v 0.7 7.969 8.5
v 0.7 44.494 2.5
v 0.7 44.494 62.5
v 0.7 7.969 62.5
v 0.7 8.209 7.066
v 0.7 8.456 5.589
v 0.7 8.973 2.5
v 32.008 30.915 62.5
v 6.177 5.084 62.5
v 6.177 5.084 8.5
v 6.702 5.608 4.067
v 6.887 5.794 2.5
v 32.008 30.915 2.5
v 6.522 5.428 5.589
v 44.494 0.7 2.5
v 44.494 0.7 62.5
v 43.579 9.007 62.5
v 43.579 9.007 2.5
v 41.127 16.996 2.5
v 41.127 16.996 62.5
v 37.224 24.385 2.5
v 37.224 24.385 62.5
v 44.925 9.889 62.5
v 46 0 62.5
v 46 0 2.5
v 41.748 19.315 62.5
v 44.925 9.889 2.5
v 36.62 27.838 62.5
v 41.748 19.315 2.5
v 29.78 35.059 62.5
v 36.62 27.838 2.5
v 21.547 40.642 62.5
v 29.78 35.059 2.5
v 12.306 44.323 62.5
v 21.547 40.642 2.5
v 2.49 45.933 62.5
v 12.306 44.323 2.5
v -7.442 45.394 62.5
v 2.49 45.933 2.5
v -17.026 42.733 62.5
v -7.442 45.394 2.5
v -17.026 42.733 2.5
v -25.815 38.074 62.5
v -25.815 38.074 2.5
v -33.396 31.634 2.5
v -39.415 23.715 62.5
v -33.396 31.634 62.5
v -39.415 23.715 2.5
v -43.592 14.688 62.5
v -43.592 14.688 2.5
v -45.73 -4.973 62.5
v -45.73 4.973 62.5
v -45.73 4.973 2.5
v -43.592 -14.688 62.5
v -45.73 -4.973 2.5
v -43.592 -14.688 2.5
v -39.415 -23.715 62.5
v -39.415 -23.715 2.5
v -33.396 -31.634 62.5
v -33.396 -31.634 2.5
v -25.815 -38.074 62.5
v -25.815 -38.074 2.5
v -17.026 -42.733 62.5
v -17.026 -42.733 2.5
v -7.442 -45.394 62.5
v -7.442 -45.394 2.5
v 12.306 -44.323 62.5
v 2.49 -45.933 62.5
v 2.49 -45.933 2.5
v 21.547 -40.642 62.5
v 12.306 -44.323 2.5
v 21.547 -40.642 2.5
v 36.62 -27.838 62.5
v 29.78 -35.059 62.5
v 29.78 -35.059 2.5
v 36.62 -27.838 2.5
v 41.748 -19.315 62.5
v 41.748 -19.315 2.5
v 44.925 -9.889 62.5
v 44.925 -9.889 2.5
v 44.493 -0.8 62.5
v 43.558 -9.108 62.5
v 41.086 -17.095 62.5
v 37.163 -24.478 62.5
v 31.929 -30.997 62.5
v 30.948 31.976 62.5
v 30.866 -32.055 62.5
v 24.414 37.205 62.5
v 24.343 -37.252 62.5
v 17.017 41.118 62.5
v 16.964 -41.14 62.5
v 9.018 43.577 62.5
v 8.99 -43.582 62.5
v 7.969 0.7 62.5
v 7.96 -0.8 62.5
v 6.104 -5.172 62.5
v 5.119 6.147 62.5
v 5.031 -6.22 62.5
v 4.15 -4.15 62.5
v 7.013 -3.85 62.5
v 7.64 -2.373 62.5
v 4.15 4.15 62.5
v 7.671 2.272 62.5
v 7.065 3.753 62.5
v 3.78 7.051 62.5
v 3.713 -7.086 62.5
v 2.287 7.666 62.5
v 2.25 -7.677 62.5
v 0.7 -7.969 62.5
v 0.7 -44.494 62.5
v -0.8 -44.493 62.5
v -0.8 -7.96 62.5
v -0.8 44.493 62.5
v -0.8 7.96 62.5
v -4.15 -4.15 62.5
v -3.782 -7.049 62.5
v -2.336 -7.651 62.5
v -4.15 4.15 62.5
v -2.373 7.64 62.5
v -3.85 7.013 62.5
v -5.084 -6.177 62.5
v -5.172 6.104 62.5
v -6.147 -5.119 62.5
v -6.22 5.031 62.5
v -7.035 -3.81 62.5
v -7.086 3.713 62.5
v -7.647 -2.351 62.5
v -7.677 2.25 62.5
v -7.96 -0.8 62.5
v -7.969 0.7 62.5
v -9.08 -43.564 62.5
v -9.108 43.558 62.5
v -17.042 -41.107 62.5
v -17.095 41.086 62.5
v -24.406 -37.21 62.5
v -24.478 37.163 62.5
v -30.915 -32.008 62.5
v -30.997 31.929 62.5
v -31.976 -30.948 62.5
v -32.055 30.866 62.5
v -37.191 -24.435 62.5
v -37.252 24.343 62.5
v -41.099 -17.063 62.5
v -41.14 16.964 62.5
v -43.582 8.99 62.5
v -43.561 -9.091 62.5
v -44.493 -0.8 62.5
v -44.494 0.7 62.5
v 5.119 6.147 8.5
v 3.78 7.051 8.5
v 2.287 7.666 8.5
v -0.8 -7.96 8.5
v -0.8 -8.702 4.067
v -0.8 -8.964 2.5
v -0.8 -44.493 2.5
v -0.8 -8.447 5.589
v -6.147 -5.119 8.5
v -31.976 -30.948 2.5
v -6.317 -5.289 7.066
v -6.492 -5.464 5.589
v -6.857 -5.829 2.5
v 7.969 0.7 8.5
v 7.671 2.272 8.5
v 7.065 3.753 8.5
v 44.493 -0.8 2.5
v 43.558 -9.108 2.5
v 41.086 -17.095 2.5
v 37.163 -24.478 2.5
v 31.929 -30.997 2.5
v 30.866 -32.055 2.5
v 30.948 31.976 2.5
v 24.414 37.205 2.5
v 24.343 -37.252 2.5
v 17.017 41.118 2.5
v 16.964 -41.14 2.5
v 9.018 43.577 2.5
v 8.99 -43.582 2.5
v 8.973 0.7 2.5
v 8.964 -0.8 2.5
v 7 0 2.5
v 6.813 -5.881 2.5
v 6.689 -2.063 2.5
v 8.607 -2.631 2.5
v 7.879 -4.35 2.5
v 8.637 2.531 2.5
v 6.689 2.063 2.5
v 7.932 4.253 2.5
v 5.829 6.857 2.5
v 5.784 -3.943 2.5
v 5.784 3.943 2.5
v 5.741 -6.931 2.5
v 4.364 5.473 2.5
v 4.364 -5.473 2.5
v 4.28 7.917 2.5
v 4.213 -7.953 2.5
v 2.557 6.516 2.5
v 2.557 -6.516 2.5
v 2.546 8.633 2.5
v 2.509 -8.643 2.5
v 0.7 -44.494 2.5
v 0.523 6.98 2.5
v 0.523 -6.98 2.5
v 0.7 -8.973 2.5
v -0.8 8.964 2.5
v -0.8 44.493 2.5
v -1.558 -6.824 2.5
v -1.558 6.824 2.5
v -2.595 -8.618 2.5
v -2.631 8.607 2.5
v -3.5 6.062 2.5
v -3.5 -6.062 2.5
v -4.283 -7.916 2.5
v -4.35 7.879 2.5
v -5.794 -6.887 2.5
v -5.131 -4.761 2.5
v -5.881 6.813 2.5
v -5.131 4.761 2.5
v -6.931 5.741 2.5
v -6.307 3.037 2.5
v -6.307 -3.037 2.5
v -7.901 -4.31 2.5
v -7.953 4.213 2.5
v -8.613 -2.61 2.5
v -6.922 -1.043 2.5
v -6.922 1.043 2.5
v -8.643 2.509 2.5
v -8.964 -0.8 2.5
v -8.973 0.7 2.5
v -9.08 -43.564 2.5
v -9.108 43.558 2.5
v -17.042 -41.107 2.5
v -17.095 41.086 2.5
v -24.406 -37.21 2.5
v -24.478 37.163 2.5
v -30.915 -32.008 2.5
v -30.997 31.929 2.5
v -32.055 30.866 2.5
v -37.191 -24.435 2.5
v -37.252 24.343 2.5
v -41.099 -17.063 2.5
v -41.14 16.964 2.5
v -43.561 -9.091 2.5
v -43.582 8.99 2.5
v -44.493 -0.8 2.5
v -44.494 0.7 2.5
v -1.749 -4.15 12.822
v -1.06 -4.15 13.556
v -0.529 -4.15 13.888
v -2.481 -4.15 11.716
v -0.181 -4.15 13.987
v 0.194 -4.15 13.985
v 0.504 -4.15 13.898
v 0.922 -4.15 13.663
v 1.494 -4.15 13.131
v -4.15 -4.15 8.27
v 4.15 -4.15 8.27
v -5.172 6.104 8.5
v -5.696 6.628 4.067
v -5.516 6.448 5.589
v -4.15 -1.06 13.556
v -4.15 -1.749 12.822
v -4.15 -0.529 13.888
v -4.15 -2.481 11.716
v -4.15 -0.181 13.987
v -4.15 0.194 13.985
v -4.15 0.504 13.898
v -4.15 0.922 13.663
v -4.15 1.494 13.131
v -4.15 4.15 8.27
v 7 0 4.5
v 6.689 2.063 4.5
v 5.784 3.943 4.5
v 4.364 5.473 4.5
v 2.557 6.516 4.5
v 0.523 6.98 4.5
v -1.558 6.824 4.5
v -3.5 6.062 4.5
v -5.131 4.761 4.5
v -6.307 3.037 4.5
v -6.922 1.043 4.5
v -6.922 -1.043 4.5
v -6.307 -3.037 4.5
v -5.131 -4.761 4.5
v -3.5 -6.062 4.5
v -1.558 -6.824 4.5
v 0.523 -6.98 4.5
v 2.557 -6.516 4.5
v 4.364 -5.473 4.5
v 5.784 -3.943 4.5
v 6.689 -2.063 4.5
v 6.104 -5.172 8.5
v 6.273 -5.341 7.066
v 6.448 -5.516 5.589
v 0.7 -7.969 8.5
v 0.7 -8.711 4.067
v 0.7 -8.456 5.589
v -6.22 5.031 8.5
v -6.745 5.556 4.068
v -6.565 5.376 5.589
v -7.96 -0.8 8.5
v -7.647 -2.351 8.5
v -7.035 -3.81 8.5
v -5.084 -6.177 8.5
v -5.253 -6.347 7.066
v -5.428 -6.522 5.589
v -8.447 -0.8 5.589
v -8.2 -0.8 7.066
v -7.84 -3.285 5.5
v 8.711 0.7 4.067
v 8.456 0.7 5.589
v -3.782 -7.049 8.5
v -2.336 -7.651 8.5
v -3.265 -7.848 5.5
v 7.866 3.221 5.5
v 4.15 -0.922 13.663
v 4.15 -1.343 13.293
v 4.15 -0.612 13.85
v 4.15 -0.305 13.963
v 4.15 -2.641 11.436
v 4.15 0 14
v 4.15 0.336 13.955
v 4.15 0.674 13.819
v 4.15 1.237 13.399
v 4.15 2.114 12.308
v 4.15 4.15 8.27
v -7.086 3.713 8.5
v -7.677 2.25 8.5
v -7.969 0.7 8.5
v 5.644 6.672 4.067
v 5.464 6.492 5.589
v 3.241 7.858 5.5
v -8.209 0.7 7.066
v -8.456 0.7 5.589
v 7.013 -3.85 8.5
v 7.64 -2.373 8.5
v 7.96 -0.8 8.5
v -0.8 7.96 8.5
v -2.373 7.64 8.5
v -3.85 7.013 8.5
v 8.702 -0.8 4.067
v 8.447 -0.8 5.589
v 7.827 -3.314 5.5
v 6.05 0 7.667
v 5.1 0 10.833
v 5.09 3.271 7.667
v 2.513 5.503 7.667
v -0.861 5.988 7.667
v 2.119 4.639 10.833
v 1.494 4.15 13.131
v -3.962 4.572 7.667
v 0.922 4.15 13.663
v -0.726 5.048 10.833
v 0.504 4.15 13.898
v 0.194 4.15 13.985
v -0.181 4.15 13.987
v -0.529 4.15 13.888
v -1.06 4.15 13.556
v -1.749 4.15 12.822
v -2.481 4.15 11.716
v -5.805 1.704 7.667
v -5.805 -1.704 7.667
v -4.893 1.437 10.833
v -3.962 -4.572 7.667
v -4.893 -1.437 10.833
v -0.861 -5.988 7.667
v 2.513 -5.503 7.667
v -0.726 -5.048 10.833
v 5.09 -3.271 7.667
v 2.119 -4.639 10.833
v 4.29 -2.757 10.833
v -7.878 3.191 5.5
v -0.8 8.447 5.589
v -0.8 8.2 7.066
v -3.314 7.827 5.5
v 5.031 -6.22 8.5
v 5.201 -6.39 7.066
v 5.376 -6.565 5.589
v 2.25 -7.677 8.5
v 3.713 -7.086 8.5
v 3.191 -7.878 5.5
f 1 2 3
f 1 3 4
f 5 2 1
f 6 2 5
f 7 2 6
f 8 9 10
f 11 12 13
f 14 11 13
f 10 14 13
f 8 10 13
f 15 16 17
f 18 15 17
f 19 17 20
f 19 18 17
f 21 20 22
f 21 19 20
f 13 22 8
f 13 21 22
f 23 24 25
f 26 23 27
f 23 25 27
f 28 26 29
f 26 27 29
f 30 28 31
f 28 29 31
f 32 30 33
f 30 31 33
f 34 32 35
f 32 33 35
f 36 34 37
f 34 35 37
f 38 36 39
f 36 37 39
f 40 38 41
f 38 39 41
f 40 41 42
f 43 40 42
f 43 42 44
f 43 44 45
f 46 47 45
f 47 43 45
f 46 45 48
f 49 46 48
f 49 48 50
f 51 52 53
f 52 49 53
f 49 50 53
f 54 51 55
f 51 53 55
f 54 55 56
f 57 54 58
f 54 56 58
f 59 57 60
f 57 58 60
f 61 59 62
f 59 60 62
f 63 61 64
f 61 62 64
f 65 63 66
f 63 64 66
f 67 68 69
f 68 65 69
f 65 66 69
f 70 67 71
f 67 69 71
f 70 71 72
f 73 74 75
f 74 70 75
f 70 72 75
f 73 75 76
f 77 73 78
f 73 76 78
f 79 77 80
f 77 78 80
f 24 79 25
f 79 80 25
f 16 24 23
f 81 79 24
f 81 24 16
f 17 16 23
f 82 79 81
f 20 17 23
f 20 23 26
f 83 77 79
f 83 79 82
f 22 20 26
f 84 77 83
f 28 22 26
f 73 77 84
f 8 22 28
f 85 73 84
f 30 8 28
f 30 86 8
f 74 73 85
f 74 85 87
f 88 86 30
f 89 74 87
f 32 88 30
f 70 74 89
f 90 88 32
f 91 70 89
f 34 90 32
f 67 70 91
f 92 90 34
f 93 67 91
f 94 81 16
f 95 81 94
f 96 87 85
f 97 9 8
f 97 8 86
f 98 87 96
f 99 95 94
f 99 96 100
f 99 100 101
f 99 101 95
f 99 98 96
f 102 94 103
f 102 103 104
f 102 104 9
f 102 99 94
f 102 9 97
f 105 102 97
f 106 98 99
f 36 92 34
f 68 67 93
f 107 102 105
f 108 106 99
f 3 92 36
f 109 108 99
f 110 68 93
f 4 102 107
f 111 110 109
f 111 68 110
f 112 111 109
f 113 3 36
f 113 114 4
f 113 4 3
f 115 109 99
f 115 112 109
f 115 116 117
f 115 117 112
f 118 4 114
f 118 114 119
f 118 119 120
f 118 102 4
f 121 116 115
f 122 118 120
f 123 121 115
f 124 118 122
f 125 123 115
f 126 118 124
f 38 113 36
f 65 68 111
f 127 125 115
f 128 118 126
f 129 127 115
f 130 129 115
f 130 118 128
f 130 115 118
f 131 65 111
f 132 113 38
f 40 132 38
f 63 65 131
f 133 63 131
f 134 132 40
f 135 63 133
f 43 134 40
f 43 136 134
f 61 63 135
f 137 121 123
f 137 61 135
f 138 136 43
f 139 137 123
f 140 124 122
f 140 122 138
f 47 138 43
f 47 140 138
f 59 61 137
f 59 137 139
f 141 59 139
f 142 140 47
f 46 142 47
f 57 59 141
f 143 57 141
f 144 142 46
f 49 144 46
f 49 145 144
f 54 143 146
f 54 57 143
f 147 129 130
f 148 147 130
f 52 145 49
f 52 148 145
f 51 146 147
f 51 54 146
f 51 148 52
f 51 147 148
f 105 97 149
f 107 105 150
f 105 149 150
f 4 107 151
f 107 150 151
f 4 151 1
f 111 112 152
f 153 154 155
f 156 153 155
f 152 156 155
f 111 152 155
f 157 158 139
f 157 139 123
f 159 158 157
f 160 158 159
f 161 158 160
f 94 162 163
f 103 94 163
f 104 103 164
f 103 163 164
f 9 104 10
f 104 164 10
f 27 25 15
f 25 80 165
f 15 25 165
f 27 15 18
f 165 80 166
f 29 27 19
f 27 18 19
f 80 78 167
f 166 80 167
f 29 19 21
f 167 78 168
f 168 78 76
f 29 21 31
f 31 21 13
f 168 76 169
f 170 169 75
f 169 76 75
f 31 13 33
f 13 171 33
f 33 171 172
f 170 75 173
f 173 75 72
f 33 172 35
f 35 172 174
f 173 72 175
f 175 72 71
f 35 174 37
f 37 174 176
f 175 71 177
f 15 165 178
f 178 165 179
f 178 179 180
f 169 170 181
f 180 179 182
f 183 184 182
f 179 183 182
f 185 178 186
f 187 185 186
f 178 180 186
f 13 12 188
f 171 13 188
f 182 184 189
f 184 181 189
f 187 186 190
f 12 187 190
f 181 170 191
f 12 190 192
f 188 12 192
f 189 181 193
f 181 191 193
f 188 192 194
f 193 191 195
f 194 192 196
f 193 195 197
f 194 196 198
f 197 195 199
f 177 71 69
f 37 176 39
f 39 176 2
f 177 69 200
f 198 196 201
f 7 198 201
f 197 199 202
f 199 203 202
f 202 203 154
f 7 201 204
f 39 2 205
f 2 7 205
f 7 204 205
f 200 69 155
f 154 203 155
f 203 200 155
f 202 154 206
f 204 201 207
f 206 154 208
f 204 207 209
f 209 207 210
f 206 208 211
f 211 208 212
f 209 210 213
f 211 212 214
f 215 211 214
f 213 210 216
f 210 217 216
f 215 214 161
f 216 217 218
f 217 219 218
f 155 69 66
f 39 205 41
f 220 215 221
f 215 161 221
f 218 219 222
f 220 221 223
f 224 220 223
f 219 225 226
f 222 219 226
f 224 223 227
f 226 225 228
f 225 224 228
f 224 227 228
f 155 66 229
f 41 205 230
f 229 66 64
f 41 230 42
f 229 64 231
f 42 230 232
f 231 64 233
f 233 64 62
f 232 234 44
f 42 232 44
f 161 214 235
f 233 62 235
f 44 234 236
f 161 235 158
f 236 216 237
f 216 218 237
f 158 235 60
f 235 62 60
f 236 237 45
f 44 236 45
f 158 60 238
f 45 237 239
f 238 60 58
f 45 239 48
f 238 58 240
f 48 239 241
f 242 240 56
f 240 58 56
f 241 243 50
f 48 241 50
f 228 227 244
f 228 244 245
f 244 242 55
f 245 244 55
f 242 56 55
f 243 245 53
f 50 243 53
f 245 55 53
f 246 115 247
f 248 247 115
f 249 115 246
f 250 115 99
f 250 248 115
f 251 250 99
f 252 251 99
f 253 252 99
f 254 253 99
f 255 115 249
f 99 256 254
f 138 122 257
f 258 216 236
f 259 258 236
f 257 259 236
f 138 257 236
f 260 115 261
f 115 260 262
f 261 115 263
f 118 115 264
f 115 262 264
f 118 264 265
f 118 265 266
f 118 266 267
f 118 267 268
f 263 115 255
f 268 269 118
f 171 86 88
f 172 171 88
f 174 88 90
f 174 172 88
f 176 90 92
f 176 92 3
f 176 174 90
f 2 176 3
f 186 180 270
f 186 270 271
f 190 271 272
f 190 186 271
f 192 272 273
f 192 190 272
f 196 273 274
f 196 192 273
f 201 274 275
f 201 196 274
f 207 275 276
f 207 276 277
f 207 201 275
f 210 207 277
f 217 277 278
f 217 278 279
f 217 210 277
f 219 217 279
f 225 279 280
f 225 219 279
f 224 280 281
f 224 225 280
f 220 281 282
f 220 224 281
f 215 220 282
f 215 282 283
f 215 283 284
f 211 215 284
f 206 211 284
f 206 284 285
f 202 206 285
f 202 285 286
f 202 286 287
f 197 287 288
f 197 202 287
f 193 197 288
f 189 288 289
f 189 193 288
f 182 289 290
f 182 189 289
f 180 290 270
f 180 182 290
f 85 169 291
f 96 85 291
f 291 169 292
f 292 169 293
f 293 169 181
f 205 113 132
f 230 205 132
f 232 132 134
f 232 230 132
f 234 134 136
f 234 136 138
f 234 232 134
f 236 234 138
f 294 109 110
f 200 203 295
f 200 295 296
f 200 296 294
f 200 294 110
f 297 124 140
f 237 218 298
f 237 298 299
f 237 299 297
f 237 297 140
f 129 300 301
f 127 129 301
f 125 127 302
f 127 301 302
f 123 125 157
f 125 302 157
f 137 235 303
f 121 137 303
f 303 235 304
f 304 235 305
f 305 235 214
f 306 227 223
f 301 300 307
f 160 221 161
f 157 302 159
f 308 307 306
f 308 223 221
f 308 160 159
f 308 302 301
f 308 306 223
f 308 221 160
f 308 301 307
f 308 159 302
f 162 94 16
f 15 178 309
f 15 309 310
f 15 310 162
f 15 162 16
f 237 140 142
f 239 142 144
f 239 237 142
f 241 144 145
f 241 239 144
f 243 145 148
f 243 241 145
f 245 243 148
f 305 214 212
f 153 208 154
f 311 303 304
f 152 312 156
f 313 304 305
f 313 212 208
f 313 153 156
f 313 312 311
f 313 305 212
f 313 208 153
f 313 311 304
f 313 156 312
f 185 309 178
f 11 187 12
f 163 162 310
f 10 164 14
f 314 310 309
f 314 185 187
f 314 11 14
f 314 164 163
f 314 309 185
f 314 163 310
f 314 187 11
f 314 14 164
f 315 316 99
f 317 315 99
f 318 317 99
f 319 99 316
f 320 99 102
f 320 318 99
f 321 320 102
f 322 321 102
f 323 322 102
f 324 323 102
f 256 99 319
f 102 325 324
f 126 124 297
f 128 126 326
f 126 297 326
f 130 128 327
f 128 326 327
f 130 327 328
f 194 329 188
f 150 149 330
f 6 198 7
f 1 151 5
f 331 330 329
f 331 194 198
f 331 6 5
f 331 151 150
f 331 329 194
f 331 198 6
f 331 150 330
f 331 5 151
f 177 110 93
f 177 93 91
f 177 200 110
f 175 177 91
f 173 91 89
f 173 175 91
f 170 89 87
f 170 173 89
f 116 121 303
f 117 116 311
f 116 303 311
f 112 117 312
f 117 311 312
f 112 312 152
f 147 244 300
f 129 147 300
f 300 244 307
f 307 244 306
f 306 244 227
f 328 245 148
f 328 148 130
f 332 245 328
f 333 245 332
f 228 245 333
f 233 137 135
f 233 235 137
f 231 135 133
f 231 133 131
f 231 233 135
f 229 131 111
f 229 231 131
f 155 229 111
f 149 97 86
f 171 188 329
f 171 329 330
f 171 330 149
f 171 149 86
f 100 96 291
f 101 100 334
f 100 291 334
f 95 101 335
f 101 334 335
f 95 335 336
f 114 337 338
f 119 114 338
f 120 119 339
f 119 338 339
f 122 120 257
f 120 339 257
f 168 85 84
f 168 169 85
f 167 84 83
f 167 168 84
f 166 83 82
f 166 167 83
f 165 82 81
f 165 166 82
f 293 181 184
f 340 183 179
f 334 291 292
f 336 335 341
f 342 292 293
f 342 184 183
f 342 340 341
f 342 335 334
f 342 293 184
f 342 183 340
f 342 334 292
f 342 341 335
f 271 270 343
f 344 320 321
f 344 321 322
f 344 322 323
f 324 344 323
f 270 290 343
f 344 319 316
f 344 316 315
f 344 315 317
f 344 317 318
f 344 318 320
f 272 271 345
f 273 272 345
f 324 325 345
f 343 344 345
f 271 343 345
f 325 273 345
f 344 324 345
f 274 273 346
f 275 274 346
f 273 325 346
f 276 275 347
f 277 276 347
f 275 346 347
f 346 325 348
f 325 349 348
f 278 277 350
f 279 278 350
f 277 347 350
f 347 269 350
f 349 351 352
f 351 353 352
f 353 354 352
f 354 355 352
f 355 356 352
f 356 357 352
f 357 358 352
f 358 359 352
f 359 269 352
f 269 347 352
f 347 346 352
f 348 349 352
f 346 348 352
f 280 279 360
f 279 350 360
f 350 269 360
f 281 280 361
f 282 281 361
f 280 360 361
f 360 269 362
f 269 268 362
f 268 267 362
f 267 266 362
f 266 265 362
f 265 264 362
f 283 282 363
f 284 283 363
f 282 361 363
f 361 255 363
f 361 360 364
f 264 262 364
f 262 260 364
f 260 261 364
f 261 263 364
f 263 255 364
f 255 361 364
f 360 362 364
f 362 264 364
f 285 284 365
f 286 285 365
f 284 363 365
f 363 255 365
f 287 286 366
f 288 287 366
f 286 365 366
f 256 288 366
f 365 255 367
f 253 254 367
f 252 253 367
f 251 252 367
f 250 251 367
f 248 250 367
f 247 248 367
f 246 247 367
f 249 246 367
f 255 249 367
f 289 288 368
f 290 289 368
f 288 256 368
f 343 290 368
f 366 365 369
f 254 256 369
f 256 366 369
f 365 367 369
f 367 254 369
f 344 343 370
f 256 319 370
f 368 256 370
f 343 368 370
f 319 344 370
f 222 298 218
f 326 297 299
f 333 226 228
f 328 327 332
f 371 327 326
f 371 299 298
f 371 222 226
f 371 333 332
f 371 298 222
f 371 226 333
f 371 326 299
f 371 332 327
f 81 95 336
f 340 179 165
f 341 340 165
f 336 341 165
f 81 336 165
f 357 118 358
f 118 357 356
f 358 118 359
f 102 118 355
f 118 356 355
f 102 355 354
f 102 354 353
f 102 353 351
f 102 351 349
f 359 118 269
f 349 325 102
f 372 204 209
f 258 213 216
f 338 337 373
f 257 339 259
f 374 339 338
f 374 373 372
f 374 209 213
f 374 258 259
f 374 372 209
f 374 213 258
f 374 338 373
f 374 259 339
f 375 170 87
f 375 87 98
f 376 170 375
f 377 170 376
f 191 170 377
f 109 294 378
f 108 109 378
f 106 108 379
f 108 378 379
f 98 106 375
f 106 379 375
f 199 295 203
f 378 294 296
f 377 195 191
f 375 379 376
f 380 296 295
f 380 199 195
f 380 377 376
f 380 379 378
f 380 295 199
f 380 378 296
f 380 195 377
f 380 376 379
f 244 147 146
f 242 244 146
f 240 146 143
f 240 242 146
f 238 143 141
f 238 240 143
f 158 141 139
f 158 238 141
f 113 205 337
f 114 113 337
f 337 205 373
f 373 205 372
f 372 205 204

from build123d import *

# Parameters (mm, degrees)
CYLINDER014_R          = 7
CYLINDER014_DEPTH      = 2
TUBE015_R              = 60
TUBE015_R_2            = 46
TUBE015_DEPTH          = 60
BOX004_W               = 8.3
BOX004_H               = 8.3
BOX004_DEPTH           = 60
BOX003_W               = 100
BOX003_H               = 1.5
BOX003_DEPTH           = 60
CYLINDER001_R          = 8
CYLINDER001_DEPTH      = 60
TUBE_R                 = 46
TUBE_R_2               = 44.5
TUBE_DEPTH             = 60
BOX024_W               = 100
BOX024_H               = 1.5
BOX024_DEPTH           = 60
BOX024_PLACEMENT_ANGLE = 45
BOX025_W               = 100
BOX025_H               = 1.5
BOX025_DEPTH           = 60
BOX025_PLACEMENT_ANGLE = 135
BOX_W                  = 100
BOX_H                  = 1.5
BOX_DEPTH              = 60


with BuildPart() as cone:
    # Cone → Cone (revolve)
    with BuildSketch(Plane(origin=(0, 0, 2), x_dir=(1, 0, 0), z_dir=(0, -1, 0))):
        Polygon((0, 0), (7, 0), (4, 10), (0, 10), align=None)
    revolve(axis=Axis((0, 0, 2), (0, 0, 1)))


with BuildPart() as cylinder014:
    # Cylinder014 → Cylinder014 (new body)
    with BuildSketch(Plane.XY):
        Circle(CYLINDER014_R)
    extrude(amount=CYLINDER014_DEPTH)


with BuildPart() as tube015:
    # Tube015 → Tube015 (new body)
    with BuildSketch(Plane.XY):
        Circle(TUBE015_R)
        Circle(TUBE015_R_2, mode=Mode.SUBTRACT)
    extrude(amount=TUBE015_DEPTH)


with BuildPart() as fusion001:
    # Box004 → Box004 (new body)
    with BuildSketch(Plane(origin=(-4.15, -4.15, 0), x_dir=(1, 0, 0), z_dir=(0, 0, 1))):
        with Locations((4.15, 4.15)):
            Rectangle(BOX004_W, BOX004_H)
    extrude(amount=BOX004_DEPTH)

    # Fusion001: union Cone, Cylinder014, Tube015
    add(cone.part)
    add(cylinder014.part)
    add(tube015.part)


with BuildPart() as cube003:
    # Box003 → Box003 (new body)
    with BuildSketch(Plane(origin=(-0.8, 48.5, 0), x_dir=(0, -1, 0), z_dir=(0, 0, 1))):
        with Locations((50, 0.75)):
            Rectangle(BOX003_W, BOX003_H)
    extrude(amount=BOX003_DEPTH)


with BuildPart() as cylinder001:
    # Cylinder001 → Cylinder001 (new body)
    with BuildSketch(Plane.XY):
        Circle(CYLINDER001_R)
    extrude(amount=CYLINDER001_DEPTH)


with BuildPart() as tube:
    # Tube → Tube (new body)
    with BuildSketch(Plane.XY):
        Circle(TUBE_R)
        Circle(TUBE_R_2, mode=Mode.SUBTRACT)
    extrude(amount=TUBE_DEPTH)


with BuildPart() as cone001:
    # Cone001 → Cone001 (revolve)
    with BuildSketch(Plane.XZ):
        Polygon((0, 0), (9, 0), (4, 30), (0, 30), align=None)
    revolve(axis=Axis((0, 0, 0), (0, 0, 1)))


with BuildPart() as cube024:
    # Box024 → Box024 (new body)
    with BuildSketch(Plane.XY):
        with Locations((50, 0.75)):
            Rectangle(BOX024_W, BOX024_H)
    extrude(amount=BOX024_DEPTH)


with BuildPart() as cube024_1:
    # Box024 placement: moved
    add(cube024.part.moved(Location((-32.999286, -34.092597, 0))).rotate(Axis((-32.999286, -34.092597, 0), (0, 0, 1)), BOX024_PLACEMENT_ANGLE))


with BuildPart() as cube025:
    # Box025 → Box025 (new body)
    with BuildSketch(Plane.XY):
        with Locations((50, 0.75)):
            Rectangle(BOX025_W, BOX025_H)
    extrude(amount=BOX025_DEPTH)


with BuildPart() as cube025_1:
    # Box025 placement: moved
    add(cube025.part.moved(Location((34.387991, -33.456201, 0))).rotate(Axis((34.387991, -33.456201, 0), (0, 0, 1)), BOX025_PLACEMENT_ANGLE))


with BuildPart() as cut_vnutro:
    # Box → Box (new body)
    with BuildSketch(Plane(origin=(-47, -0.8, 0), x_dir=(1, 0, 0), z_dir=(0, 0, 1))):
        with Locations((50, 0.75)):
            Rectangle(BOX_W, BOX_H)
    extrude(amount=BOX_DEPTH)

    # Fusion: union Cube003, Cylinder001, Tube, Cone001, Cube024, Cube025
    add(cube003.part)
    add(cylinder001.part)
    add(tube.part)
    add(cone001.part)
    add(cube024_1.part)
    add(cube025_1.part)

    # Cut: cut Fusion001
    add(fusion001.part, mode=Mode.SUBTRACT)


with BuildPart() as cut_vnutro_1:
    # Cut placement: moved
    add(cut_vnutro.part.moved(Location((0, 0, 2.5))))


solid = cut_vnutro_1.part
